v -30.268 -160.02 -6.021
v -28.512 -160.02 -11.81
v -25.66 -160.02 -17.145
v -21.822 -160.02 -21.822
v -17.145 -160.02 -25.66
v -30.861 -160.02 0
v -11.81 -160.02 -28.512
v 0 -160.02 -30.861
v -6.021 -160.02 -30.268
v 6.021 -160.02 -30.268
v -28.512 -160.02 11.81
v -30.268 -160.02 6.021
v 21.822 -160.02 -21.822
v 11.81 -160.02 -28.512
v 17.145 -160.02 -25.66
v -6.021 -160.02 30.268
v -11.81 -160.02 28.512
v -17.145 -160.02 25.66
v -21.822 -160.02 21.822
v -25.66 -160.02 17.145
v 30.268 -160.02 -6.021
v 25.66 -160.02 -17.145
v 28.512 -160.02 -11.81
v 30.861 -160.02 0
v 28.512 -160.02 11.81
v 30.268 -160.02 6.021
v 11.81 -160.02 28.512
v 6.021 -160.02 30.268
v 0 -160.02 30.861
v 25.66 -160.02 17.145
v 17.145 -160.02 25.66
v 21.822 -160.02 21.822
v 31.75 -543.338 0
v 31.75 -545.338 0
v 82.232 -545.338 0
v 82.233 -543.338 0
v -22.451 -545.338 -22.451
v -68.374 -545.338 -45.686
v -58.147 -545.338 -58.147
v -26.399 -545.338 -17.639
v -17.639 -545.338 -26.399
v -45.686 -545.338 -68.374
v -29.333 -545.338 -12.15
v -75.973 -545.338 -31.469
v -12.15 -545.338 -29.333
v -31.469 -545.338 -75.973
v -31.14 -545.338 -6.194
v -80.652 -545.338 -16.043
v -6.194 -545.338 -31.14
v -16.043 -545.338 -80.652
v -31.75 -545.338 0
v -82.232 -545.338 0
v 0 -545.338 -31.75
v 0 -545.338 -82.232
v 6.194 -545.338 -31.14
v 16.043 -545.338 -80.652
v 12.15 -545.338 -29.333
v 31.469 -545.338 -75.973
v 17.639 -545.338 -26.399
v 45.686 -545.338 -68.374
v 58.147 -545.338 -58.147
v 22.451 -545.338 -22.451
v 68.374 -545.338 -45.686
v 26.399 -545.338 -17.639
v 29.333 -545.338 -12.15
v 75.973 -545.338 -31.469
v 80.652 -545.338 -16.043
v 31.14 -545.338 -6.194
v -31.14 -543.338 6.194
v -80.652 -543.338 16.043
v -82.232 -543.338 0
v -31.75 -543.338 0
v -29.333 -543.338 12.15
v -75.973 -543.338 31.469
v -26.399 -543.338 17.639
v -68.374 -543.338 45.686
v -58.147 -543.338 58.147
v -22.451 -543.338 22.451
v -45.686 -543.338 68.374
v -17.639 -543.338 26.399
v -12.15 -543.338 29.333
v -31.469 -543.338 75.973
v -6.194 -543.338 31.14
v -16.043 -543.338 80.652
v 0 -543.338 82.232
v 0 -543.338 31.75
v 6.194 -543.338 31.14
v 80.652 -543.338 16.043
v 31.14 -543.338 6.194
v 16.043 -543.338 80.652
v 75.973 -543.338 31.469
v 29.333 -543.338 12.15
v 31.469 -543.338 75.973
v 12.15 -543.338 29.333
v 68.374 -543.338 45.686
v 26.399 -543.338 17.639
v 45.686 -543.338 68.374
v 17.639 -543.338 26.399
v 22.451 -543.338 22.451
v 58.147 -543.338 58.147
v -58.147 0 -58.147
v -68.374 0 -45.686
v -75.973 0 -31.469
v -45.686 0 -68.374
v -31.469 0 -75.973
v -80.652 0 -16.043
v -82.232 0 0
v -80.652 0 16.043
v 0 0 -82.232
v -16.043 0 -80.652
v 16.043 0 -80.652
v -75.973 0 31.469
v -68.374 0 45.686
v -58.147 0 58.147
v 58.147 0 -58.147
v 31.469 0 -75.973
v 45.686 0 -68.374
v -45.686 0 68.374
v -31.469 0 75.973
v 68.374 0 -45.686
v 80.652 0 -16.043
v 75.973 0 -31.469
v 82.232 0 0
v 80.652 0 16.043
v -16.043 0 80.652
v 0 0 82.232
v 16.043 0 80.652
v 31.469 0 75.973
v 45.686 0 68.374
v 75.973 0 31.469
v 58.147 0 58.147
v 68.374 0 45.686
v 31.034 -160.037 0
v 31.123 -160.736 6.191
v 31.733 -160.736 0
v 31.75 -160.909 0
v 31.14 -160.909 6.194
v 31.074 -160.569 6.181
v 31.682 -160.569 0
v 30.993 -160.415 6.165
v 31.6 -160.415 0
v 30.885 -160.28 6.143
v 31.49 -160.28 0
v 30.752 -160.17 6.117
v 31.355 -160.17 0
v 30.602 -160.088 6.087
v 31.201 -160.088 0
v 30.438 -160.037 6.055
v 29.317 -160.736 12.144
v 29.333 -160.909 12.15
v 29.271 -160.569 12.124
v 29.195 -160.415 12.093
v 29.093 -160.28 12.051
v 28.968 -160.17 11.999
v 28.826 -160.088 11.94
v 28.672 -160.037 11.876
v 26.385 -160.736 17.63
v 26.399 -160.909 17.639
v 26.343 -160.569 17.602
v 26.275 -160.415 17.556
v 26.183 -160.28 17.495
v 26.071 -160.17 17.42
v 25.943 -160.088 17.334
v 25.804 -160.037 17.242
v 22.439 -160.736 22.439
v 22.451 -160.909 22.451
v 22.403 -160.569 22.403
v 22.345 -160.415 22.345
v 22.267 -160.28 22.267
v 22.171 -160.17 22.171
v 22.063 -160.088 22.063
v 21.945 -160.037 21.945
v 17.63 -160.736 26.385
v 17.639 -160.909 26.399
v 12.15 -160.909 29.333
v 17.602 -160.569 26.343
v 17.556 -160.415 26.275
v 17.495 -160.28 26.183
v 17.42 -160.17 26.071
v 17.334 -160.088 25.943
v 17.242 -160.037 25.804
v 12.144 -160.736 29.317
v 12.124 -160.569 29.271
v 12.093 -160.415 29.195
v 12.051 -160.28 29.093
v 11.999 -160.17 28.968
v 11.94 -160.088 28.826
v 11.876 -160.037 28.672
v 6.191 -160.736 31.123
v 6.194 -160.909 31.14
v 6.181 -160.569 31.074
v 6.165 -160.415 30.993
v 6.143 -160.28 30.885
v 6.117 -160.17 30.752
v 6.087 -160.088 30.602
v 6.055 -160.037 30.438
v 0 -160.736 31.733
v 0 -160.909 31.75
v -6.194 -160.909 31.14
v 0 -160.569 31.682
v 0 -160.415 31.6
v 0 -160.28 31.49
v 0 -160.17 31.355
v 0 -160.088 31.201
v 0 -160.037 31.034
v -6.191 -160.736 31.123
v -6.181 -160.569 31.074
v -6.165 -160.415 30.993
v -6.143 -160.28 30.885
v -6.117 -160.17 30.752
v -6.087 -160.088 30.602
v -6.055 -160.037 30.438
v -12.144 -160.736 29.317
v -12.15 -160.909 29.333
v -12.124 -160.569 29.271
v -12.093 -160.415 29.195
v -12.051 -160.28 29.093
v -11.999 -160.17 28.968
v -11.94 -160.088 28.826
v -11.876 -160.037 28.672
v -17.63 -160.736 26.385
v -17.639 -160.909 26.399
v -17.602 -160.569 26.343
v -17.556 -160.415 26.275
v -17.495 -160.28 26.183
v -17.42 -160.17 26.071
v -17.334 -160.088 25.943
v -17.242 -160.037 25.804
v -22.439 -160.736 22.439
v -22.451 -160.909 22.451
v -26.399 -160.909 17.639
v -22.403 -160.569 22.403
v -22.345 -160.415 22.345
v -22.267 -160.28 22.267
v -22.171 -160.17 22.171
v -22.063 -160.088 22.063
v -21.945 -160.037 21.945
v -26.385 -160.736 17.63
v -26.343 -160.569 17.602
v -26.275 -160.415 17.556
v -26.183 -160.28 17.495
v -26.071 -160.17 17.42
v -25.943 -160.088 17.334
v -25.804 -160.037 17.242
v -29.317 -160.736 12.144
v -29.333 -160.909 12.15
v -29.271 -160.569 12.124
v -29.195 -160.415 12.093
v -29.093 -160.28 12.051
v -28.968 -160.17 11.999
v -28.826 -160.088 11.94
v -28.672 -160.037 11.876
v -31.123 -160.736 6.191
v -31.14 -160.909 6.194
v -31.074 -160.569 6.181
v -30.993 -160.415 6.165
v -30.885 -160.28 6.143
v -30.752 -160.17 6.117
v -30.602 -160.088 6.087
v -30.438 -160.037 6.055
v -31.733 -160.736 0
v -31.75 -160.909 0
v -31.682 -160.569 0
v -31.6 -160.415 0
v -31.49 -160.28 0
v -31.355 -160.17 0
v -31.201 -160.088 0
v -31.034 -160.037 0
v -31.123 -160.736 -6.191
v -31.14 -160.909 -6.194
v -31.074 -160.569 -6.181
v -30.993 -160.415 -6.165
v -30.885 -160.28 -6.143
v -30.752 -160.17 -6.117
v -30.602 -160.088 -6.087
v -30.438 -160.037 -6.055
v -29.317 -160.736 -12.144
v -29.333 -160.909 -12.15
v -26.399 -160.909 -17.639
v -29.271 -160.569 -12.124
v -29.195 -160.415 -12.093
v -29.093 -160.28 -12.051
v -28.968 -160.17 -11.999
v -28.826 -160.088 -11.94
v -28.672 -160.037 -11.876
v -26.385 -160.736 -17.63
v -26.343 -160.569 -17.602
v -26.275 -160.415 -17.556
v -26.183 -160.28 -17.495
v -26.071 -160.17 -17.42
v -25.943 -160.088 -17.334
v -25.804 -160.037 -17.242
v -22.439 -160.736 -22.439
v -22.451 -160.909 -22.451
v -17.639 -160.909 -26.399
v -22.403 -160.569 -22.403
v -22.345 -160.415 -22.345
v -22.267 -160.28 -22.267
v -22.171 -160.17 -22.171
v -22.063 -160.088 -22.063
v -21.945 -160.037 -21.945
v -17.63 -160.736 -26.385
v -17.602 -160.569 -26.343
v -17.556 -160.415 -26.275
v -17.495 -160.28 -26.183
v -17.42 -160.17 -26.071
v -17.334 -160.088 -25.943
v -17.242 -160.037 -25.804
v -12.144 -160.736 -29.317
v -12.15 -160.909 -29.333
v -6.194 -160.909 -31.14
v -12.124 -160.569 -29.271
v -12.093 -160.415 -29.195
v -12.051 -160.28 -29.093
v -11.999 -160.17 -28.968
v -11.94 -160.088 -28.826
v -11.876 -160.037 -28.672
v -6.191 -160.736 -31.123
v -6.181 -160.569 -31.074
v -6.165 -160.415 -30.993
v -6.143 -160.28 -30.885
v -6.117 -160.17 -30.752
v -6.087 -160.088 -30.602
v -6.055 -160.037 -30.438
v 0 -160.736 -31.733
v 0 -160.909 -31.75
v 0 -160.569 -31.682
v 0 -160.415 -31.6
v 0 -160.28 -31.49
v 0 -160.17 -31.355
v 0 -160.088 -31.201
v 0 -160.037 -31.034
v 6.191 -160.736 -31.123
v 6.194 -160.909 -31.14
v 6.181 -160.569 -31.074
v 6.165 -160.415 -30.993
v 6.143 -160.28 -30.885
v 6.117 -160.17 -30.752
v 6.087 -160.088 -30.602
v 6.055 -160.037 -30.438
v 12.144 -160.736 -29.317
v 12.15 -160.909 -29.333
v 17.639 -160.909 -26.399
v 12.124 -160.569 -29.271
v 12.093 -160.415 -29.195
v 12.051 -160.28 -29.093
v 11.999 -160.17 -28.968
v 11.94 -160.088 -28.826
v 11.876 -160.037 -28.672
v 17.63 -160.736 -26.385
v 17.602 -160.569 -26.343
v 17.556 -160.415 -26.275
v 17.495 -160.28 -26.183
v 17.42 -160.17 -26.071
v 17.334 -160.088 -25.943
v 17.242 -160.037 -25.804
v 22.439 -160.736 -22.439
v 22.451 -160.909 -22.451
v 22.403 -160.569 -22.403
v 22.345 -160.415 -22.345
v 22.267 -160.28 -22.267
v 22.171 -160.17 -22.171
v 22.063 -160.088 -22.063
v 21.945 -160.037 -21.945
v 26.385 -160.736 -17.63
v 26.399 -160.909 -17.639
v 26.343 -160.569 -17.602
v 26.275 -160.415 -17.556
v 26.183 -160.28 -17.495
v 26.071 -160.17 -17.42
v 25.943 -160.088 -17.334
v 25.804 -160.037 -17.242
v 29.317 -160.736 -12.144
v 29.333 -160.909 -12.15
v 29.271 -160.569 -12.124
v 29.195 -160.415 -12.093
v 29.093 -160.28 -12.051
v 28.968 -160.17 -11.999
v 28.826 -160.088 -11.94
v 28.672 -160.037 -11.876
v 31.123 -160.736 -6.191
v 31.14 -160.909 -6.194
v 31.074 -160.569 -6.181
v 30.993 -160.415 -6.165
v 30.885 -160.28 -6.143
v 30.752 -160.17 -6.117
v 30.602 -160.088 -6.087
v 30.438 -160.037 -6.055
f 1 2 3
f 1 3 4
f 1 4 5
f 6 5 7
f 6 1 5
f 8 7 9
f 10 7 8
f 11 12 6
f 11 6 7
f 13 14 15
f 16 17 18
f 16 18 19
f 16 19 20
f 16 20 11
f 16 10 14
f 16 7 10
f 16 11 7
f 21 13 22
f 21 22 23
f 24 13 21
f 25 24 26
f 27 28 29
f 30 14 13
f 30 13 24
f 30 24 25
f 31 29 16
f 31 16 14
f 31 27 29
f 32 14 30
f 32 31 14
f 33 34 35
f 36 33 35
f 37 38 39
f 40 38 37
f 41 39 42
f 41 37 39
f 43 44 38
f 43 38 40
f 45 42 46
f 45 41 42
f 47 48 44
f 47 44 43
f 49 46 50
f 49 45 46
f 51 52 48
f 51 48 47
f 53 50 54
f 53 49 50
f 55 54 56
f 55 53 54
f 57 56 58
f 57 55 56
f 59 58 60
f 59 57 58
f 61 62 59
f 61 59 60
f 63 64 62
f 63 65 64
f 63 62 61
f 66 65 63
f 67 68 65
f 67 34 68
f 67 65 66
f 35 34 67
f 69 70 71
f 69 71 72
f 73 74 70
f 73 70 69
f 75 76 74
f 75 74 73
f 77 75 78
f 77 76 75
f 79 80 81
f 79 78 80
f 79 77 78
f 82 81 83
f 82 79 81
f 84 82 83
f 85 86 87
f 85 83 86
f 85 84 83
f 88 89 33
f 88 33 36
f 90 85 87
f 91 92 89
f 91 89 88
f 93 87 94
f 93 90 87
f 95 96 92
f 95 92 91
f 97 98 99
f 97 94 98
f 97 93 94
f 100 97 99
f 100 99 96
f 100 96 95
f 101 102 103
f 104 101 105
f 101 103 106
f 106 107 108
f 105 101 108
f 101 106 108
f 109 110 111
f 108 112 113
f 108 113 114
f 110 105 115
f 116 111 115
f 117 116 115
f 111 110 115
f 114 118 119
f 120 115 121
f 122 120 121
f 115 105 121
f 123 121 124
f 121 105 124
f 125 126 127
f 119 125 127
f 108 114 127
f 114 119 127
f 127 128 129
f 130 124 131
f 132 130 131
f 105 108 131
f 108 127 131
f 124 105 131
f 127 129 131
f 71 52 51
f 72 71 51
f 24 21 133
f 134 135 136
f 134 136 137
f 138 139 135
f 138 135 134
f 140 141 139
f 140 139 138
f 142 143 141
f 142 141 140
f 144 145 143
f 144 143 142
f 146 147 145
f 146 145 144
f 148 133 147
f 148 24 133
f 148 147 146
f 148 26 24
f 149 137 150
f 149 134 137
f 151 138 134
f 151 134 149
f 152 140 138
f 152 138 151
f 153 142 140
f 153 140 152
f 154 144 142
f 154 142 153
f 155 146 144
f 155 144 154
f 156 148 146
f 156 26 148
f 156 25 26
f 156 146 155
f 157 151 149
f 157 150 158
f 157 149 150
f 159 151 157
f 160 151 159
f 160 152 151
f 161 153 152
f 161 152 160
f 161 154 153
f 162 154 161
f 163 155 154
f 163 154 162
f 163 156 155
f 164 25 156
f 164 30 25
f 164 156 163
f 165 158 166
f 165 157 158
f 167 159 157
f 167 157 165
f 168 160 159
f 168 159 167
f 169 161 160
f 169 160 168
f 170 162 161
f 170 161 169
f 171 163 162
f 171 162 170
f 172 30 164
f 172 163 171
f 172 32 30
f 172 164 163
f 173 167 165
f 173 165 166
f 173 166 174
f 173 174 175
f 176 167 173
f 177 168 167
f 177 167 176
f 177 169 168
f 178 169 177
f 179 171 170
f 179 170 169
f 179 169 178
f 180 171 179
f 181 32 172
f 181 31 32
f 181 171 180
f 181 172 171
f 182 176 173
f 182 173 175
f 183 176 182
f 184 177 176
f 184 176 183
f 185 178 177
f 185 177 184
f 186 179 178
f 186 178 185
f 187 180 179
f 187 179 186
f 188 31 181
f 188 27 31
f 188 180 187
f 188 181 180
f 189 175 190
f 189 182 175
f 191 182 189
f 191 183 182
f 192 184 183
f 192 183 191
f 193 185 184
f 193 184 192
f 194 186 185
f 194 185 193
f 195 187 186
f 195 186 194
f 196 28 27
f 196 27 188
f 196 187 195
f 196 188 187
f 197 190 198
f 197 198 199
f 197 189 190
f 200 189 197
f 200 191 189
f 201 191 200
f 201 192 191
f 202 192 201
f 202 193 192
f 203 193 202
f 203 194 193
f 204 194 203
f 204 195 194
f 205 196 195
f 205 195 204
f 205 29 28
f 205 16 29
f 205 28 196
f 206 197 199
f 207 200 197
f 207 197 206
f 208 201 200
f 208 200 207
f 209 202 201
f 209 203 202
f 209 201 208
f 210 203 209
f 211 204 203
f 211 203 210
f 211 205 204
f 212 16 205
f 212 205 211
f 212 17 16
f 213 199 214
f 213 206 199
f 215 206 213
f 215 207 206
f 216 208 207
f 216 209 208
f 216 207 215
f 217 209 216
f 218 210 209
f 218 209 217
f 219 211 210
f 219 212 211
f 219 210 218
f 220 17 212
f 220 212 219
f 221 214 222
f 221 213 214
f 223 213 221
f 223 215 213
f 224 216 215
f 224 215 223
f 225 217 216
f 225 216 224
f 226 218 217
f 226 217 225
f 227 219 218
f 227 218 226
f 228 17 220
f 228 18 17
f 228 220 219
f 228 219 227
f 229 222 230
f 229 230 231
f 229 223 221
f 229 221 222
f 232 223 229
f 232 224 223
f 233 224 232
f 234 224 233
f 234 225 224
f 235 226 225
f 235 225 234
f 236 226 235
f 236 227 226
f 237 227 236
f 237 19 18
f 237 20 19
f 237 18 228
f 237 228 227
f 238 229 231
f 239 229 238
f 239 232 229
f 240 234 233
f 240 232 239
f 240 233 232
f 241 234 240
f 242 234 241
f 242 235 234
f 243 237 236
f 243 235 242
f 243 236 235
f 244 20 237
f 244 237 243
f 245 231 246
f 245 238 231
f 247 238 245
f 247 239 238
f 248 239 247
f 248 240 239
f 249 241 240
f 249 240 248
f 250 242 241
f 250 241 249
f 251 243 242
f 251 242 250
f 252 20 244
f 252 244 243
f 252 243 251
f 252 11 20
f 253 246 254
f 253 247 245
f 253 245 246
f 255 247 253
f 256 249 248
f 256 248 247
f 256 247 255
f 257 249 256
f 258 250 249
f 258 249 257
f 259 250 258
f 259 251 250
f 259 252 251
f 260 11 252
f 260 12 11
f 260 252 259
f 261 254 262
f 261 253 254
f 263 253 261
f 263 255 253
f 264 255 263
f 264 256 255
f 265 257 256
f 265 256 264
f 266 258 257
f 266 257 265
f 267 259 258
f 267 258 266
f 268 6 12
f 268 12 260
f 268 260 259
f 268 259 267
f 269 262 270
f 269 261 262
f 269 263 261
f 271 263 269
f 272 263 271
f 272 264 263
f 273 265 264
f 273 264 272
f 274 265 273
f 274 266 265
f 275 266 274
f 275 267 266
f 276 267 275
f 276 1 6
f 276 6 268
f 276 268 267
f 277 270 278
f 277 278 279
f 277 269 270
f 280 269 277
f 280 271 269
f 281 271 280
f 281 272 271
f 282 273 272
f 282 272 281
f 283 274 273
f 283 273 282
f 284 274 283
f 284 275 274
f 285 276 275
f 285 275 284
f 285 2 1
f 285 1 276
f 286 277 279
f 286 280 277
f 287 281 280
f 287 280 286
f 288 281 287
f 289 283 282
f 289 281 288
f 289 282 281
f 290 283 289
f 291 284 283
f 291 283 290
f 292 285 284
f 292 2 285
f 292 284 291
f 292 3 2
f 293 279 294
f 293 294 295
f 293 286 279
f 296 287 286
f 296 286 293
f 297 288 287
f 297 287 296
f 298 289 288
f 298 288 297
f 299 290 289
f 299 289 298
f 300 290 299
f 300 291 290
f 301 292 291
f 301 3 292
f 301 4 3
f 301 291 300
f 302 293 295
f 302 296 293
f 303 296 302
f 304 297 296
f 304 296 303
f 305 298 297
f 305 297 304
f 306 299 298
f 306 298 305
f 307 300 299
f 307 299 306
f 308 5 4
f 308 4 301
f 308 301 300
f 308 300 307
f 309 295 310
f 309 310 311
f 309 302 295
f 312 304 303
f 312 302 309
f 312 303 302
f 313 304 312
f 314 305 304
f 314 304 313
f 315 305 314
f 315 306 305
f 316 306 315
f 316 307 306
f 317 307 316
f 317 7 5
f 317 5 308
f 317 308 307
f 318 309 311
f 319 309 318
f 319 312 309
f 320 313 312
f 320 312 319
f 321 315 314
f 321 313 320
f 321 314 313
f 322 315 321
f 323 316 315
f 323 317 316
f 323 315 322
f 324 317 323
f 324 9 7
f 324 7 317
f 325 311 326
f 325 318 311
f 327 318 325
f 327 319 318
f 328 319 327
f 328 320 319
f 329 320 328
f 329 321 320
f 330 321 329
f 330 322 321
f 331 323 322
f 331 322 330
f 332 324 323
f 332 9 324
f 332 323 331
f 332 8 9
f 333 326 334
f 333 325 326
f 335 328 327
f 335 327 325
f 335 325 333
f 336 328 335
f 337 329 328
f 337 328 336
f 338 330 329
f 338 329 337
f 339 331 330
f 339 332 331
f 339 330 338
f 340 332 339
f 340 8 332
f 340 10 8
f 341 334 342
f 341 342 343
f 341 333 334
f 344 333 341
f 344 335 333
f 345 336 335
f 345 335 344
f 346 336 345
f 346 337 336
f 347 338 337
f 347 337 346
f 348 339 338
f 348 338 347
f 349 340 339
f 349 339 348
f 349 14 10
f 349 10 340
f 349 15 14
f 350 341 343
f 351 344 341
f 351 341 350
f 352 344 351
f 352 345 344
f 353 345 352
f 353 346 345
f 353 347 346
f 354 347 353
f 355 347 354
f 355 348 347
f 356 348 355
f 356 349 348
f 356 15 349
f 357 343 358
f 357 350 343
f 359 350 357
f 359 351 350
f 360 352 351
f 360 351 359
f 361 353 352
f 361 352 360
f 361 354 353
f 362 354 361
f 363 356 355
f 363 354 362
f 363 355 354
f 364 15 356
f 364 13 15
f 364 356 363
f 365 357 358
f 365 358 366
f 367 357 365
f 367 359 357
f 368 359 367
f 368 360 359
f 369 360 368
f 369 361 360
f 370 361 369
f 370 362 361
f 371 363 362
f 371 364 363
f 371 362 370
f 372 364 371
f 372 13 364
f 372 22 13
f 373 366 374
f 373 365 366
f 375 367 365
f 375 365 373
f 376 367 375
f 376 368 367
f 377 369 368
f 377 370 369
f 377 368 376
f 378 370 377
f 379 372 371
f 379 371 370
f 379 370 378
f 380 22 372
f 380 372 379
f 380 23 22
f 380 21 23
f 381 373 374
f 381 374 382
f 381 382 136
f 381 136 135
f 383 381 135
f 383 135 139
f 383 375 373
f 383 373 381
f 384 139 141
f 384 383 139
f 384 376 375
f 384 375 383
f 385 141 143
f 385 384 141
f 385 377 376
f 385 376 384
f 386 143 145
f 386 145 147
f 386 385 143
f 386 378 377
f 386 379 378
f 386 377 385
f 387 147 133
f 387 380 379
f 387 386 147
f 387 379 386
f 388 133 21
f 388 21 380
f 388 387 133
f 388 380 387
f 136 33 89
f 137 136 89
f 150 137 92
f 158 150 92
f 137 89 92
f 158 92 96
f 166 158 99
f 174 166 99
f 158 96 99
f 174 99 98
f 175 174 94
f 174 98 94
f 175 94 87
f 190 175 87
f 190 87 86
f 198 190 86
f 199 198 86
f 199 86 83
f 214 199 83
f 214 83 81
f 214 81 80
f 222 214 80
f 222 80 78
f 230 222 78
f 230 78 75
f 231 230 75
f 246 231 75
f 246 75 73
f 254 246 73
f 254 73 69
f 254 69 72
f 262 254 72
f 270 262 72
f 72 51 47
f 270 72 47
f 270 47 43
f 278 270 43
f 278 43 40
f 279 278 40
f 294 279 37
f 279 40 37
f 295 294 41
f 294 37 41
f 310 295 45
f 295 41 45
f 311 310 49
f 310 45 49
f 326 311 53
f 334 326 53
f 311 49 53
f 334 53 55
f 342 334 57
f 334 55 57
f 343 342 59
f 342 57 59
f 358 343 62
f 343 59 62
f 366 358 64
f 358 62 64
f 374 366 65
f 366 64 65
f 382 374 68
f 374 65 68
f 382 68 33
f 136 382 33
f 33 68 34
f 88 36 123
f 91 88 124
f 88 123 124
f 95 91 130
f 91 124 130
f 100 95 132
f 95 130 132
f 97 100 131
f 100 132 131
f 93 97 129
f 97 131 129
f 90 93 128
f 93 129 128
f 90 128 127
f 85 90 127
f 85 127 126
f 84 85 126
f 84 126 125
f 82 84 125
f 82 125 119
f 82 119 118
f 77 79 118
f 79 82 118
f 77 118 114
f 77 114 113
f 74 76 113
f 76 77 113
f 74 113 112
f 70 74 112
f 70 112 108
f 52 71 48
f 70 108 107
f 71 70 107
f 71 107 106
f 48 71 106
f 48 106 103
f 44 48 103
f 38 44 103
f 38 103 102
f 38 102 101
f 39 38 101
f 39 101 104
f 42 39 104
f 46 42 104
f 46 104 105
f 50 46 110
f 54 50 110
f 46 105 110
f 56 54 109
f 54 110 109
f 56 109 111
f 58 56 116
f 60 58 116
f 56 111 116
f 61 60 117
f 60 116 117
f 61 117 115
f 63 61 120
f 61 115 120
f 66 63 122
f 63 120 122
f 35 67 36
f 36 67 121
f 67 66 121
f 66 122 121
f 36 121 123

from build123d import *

# Parameters (mm, degrees)
F0_R     = 82.2325
F1_DEPTH = 545.338
F2_R     = 31.75
F3_DEPTH = 385.318
F4_R     = 0.889
F6_DEPTH = 2


with BuildPart() as f1:
    # F0 (on Front) → F1 (new body)
    with BuildSketch(Plane.XZ):
        Circle(F0_R)
    extrude(amount=F1_DEPTH)

    # F2 (on face) → F3 (cut)
    with BuildSketch(Plane.XZ.offset(545.338)):
        Circle(F2_R)
    extrude(amount=-F3_DEPTH, mode=Mode.SUBTRACT)

    # F4
    f4_edges = [f1.edges().sort_by_distance(p)[0] for p in [
        (-31.75, -160.02, 0),
    ]]
    fillet(f4_edges, radius=F4_R)

    # F5 (on face) → F6 (cut)
    with BuildSketch(Plane.XZ.offset(545.338)):
        Polygon((-94.683126, 74.995518), (-90.933107, 0), (99.84915, 0), (85.317813, 66.08922), (21.098729, 103.589416), (-59.526693, 95.151864), align=None)
    extrude(amount=-F6_DEPTH, mode=Mode.SUBTRACT)


solid = f1.part
